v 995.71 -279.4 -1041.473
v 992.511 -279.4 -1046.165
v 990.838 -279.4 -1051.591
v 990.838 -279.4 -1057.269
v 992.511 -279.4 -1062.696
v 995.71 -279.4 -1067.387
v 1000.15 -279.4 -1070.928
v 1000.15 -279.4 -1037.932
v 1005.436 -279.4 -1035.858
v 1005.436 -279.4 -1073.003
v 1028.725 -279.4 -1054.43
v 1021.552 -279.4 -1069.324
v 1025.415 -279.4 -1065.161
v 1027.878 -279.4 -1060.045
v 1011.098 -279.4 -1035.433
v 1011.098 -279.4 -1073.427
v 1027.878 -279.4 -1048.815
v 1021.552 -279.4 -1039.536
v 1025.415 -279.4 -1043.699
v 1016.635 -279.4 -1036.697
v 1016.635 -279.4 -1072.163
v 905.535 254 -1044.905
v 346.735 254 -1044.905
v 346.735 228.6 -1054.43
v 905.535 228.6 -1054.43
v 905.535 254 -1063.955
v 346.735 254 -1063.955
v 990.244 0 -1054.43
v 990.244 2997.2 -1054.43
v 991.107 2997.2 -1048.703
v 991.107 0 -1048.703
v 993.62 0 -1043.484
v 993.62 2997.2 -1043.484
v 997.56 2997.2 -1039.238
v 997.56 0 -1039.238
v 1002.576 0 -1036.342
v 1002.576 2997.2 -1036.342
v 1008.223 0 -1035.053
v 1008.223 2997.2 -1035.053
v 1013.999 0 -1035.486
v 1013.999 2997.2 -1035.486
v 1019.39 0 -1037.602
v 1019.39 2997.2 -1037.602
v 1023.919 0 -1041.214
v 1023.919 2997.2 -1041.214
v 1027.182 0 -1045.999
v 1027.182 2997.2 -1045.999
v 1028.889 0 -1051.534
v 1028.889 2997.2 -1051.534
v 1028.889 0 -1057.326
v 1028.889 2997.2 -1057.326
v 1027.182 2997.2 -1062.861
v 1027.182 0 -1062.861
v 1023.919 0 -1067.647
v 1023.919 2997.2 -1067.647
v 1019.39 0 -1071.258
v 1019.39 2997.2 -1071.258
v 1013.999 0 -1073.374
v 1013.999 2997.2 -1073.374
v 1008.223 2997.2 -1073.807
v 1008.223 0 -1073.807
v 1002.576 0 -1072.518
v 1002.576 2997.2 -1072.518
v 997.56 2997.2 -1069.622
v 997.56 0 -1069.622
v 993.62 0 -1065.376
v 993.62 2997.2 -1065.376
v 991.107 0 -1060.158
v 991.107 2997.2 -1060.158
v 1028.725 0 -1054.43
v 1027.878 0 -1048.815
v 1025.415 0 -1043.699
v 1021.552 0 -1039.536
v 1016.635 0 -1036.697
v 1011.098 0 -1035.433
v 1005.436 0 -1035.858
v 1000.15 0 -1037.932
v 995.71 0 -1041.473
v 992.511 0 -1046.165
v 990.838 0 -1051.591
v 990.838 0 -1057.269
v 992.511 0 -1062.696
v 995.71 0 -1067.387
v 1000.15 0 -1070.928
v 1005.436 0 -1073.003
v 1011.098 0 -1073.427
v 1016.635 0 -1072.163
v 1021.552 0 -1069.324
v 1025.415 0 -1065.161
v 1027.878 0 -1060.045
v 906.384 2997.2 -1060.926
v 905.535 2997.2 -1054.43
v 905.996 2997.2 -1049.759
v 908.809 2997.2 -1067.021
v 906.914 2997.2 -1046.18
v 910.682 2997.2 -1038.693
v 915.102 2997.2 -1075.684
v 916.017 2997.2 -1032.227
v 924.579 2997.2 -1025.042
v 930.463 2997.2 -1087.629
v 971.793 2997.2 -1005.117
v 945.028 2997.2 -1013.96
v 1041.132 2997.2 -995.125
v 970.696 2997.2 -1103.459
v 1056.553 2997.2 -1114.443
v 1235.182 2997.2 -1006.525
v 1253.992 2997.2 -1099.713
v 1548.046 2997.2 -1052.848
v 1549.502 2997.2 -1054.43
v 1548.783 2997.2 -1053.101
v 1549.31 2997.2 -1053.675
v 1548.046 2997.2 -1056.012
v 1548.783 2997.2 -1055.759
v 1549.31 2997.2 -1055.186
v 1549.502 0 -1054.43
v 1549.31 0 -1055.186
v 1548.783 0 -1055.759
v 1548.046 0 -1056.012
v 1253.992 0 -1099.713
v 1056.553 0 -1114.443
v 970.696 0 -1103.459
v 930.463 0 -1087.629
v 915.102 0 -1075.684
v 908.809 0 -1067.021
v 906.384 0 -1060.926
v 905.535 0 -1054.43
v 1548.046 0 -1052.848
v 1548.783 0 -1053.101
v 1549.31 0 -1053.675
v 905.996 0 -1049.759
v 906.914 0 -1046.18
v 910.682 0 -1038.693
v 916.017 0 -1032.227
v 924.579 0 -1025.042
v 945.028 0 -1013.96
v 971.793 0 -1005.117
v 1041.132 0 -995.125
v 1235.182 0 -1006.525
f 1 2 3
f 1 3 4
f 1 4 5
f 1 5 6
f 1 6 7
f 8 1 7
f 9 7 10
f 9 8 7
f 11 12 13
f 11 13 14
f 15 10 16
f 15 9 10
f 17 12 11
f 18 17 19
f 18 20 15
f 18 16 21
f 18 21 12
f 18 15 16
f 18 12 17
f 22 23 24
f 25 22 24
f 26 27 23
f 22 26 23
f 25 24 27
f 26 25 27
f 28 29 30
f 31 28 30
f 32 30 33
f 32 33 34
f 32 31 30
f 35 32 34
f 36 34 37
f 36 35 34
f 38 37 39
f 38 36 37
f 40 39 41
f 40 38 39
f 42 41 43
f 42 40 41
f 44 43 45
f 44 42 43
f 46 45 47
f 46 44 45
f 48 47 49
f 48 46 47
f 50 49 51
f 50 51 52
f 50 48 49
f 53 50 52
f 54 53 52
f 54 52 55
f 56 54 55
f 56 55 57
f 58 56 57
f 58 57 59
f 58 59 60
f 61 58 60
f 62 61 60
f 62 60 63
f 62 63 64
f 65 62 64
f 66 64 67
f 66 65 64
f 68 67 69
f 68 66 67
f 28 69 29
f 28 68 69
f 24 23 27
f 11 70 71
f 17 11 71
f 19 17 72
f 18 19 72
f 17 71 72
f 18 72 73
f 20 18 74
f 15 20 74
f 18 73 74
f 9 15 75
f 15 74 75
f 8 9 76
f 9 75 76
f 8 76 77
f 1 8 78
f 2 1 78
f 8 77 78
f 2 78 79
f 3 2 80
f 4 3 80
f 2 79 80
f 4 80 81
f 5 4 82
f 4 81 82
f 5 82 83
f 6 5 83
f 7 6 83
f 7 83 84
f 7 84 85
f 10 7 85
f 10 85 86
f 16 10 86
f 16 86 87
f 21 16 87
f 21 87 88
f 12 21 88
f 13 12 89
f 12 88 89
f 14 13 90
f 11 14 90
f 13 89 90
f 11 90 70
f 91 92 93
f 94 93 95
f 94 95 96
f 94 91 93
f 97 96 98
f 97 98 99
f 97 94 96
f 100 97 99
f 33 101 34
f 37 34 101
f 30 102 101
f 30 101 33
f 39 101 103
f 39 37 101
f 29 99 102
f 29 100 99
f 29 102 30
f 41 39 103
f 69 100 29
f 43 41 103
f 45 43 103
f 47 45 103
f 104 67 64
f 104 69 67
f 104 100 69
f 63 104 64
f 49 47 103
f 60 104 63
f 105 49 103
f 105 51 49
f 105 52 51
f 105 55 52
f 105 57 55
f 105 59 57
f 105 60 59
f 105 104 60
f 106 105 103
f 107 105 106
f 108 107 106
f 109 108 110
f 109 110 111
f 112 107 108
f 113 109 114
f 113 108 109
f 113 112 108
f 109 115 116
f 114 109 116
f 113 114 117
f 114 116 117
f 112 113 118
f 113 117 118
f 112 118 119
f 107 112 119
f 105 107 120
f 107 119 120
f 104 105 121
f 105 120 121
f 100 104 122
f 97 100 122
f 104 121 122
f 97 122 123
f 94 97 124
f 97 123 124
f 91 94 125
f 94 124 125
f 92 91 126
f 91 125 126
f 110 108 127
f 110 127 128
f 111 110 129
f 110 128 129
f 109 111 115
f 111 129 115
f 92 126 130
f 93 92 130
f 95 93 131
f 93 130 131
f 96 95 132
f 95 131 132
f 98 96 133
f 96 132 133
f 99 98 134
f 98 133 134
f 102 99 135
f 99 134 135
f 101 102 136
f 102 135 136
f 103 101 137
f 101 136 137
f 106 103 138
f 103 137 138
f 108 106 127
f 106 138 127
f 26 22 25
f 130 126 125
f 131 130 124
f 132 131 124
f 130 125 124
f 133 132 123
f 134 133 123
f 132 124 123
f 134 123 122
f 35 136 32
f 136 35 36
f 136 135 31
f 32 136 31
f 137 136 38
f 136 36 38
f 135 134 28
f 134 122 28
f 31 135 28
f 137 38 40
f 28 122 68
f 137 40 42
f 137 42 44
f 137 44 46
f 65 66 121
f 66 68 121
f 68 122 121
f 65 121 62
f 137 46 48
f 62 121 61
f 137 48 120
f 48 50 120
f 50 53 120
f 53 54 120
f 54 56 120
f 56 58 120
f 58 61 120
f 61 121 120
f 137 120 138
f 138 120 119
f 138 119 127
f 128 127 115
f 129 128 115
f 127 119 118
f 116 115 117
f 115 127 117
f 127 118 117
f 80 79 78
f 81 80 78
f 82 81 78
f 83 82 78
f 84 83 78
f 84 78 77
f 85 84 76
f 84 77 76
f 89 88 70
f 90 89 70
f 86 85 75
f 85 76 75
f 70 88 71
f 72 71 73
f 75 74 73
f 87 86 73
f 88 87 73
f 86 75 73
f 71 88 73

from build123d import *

# Parameters (mm, degrees)
BOSS_EXTRUDE2_DEPTH = 2997.2
SKETCH3_R           = 19.05
BOSS_EXTRUDE3_DEPTH = 279.4
BOSS_EXTRUDE4_DEPTH = 558.8


with BuildPart() as part:
    # Sketch2 → Boss-Extrude2 (new body)
    with BuildSketch(Plane(origin=(0, 0, 0), x_dir=(1, 0, 0), z_dir=(0, 1, 0))):
        with BuildLine():
            ThreePointArc((1549.501563464, 1054.430155843), (1549.08218451, 1055.50516717), (1548.045627141, 1056.012194665))
            add(Edge.make_bspline(
                [(1548.045627141, 1056.012194665), (1542.909791323, 1056.472519013), (1530.540909696, 1057.58114039), (1510.986556039, 1059.816213412), (1482.177884589, 1063.526776902), (1446.257152965, 1068.830094812), (1403.24224431, 1075.757081034), (1360.266558732, 1082.923578828), (1317.282336171, 1090.038800752), (1274.245745344, 1096.833109902), (1235.909717346, 1102.343296296), (1202.288019328, 1106.58475046), (1173.410335805, 1109.722628213), (1144.472152594, 1112.250283696), (1115.477538312, 1114.035552823), (1086.440285904, 1114.91850176), (1061.259922028, 1114.727950405), (1039.978587587, 1113.761025966), (1022.600495844, 1112.398571136), (1005.28616565, 1110.369387303), (988.081449654, 1107.548738994), (973.183943905, 1104.239887104), (960.605062366, 1100.668583987), (950.293736789, 1097.13582835), (940.233035207, 1092.935600496), (931.622325068, 1088.469898534), (924.483129487, 1083.888000396), (918.748261755, 1079.408348845), (914.008545213, 1074.700339431), (910.322770867, 1069.87124211), (907.699650062, 1065.078330087), (905.889335524, 1059.882116762), (905.652910054, 1056.246848831), (905.534758532, 1054.430156076)],
                knots=[0, 0, 0, 0, 0.023121883, 0.055685548, 0.088247664, 0.15337109, 0.21849516, 0.283619423, 0.348743655, 0.413867682, 0.478991363, 0.522407389, 0.565823311, 0.609239115, 0.652654647, 0.696069819, 0.739484349, 0.76553436, 0.791584249, 0.817634087, 0.843683681, 0.869732753, 0.886015097, 0.902297612, 0.91858044, 0.934862883, 0.94572109, 0.956578978, 0.967437024, 0.975584777, 0.98372934, 0.991868883, 1, 1, 1, 1], degree=3))
            add(Edge.make_bspline(
                [(905.534758532, 1054.430156076), (905.652910039, 1052.613463015), (905.88933546, 1048.978194781), (907.699649807, 1043.781981262), (910.322771314, 1038.98906985), (914.008544543, 1034.159972218), (918.748262951, 1029.451964506), (924.483128543, 1024.972310552), (931.622325102, 1020.390413689), (940.233036612, 1015.924714877), (950.293735449, 1011.724480454), (960.605062585, 1008.191728555), (973.18394417, 1004.620427227), (988.081450073, 1001.311576473), (1005.28616494, 998.490920502), (1022.600496189, 996.461744206), (1039.978587645, 995.099288886), (1061.259921893, 994.132357669), (1086.440285899, 993.94180969), (1115.477538494, 994.824755562), (1144.472152215, 996.610033065), (1173.410336049, 999.137680365), (1202.288019296, 1002.275560259), (1235.909717341, 1006.517013927), (1274.24574555, 1012.027199725), (1317.282335886, 1018.821512255), (1360.266558748, 1025.93673228), (1403.242244502, 1033.103228848), (1446.25715298, 1040.030216421), (1482.177884301, 1045.333537131), (1510.986556242, 1049.044096892), (1530.540909566, 1051.279172408), (1542.909791307, 1052.387792672), (1548.045625368, 1052.848116875)],
                knots=[0, 0, 0, 0, 0.008131119, 0.016270661, 0.024415224, 0.032562977, 0.043421021, 0.05427891, 0.065137117, 0.081419559, 0.097702389, 0.113984904, 0.130267246, 0.156316319, 0.182365913, 0.20841575, 0.23446564, 0.260515651, 0.303930181, 0.347345353, 0.390760886, 0.434176688, 0.477592611, 0.521008637, 0.586132318, 0.651256345, 0.716380577, 0.781504839, 0.84662891, 0.911752336, 0.944314452, 0.976878117, 1, 1, 1, 1], degree=3))
            ThreePointArc((1548.045625368, 1052.848116875), (1549.082183907, 1053.355143862), (1549.501563464, 1054.430155843))
        make_face()
        with BuildLine():
            ThreePointArc((1029.105776074, 1054.430155987), (1009.674776074, 1073.861155987), (990.243776074, 1054.430155987))
            ThreePointArc((990.243776074, 1054.430155987), (1009.674776074, 1034.999155987), (1029.105776074, 1054.430155987))
        make_face(mode=Mode.SUBTRACT)
    extrude(amount=BOSS_EXTRUDE2_DEPTH)


with BuildPart() as body_2:
    # Sketch3 → Boss-Extrude3 (new body)
    with BuildSketch(Plane.XZ):
        with Locations((1009.674776074, -1054.430155987)):
            Circle(SKETCH3_R)
    extrude(amount=BOSS_EXTRUDE3_DEPTH)


with BuildPart() as body_3:
    # Sketch4 → Boss-Extrude4 (new body)
    with BuildSketch(Plane(origin=(905.534758532, 0, 0), x_dir=(0, 0, -1), z_dir=(1, 0, 0))):
        Polygon((1063.955156076, 254), (1044.905156076, 254), (1054.430156076, 228.6), align=None)
    extrude(amount=-BOSS_EXTRUDE4_DEPTH)


solid = Compound([part.part, body_2.part, body_3.part])
